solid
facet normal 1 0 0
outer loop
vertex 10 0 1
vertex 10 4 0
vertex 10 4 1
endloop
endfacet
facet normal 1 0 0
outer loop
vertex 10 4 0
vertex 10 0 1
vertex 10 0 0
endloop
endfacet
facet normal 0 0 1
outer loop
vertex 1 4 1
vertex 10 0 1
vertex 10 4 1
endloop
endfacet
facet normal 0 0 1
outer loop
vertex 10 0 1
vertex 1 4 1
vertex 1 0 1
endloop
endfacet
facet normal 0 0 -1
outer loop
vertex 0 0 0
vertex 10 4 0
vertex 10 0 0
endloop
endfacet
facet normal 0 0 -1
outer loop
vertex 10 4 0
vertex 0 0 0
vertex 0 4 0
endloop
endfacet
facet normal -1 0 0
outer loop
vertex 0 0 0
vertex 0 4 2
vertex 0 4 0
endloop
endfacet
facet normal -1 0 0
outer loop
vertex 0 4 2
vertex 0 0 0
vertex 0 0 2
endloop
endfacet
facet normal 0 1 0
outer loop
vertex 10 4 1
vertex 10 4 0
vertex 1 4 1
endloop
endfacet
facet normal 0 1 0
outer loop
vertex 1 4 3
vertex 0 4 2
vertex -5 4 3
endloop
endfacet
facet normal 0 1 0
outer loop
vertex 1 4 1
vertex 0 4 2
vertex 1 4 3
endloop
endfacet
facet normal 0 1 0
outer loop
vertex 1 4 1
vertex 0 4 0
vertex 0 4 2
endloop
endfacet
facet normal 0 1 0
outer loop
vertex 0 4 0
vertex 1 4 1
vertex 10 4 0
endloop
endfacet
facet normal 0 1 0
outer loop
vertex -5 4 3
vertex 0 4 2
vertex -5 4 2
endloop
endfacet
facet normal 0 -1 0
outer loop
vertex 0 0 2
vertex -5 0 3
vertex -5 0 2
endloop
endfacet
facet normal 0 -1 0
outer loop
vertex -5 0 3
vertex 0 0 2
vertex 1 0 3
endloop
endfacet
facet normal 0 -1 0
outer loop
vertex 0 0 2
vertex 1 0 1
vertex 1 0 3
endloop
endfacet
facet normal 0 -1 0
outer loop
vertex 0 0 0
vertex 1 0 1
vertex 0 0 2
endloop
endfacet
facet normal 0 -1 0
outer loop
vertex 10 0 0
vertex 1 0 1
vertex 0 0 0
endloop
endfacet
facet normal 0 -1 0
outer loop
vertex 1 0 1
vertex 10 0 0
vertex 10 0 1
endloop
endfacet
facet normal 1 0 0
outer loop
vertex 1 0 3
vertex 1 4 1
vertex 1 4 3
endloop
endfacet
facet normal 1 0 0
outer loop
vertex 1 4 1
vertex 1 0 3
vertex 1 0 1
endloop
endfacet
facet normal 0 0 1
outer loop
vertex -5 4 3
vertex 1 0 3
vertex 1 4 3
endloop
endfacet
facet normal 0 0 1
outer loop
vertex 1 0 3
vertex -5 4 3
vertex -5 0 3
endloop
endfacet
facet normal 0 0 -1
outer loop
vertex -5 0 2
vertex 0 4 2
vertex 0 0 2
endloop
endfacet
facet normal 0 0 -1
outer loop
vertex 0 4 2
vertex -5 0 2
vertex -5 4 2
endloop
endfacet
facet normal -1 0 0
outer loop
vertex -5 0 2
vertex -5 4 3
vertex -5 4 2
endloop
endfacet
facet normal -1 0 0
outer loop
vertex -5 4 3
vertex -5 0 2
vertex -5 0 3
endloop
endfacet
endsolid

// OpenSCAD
$fn=100;
eps=1/128;

cube([10,4,1]);
cube([1,4,3]);
#translate([-5,0,2]) cube([5,4,1]);
